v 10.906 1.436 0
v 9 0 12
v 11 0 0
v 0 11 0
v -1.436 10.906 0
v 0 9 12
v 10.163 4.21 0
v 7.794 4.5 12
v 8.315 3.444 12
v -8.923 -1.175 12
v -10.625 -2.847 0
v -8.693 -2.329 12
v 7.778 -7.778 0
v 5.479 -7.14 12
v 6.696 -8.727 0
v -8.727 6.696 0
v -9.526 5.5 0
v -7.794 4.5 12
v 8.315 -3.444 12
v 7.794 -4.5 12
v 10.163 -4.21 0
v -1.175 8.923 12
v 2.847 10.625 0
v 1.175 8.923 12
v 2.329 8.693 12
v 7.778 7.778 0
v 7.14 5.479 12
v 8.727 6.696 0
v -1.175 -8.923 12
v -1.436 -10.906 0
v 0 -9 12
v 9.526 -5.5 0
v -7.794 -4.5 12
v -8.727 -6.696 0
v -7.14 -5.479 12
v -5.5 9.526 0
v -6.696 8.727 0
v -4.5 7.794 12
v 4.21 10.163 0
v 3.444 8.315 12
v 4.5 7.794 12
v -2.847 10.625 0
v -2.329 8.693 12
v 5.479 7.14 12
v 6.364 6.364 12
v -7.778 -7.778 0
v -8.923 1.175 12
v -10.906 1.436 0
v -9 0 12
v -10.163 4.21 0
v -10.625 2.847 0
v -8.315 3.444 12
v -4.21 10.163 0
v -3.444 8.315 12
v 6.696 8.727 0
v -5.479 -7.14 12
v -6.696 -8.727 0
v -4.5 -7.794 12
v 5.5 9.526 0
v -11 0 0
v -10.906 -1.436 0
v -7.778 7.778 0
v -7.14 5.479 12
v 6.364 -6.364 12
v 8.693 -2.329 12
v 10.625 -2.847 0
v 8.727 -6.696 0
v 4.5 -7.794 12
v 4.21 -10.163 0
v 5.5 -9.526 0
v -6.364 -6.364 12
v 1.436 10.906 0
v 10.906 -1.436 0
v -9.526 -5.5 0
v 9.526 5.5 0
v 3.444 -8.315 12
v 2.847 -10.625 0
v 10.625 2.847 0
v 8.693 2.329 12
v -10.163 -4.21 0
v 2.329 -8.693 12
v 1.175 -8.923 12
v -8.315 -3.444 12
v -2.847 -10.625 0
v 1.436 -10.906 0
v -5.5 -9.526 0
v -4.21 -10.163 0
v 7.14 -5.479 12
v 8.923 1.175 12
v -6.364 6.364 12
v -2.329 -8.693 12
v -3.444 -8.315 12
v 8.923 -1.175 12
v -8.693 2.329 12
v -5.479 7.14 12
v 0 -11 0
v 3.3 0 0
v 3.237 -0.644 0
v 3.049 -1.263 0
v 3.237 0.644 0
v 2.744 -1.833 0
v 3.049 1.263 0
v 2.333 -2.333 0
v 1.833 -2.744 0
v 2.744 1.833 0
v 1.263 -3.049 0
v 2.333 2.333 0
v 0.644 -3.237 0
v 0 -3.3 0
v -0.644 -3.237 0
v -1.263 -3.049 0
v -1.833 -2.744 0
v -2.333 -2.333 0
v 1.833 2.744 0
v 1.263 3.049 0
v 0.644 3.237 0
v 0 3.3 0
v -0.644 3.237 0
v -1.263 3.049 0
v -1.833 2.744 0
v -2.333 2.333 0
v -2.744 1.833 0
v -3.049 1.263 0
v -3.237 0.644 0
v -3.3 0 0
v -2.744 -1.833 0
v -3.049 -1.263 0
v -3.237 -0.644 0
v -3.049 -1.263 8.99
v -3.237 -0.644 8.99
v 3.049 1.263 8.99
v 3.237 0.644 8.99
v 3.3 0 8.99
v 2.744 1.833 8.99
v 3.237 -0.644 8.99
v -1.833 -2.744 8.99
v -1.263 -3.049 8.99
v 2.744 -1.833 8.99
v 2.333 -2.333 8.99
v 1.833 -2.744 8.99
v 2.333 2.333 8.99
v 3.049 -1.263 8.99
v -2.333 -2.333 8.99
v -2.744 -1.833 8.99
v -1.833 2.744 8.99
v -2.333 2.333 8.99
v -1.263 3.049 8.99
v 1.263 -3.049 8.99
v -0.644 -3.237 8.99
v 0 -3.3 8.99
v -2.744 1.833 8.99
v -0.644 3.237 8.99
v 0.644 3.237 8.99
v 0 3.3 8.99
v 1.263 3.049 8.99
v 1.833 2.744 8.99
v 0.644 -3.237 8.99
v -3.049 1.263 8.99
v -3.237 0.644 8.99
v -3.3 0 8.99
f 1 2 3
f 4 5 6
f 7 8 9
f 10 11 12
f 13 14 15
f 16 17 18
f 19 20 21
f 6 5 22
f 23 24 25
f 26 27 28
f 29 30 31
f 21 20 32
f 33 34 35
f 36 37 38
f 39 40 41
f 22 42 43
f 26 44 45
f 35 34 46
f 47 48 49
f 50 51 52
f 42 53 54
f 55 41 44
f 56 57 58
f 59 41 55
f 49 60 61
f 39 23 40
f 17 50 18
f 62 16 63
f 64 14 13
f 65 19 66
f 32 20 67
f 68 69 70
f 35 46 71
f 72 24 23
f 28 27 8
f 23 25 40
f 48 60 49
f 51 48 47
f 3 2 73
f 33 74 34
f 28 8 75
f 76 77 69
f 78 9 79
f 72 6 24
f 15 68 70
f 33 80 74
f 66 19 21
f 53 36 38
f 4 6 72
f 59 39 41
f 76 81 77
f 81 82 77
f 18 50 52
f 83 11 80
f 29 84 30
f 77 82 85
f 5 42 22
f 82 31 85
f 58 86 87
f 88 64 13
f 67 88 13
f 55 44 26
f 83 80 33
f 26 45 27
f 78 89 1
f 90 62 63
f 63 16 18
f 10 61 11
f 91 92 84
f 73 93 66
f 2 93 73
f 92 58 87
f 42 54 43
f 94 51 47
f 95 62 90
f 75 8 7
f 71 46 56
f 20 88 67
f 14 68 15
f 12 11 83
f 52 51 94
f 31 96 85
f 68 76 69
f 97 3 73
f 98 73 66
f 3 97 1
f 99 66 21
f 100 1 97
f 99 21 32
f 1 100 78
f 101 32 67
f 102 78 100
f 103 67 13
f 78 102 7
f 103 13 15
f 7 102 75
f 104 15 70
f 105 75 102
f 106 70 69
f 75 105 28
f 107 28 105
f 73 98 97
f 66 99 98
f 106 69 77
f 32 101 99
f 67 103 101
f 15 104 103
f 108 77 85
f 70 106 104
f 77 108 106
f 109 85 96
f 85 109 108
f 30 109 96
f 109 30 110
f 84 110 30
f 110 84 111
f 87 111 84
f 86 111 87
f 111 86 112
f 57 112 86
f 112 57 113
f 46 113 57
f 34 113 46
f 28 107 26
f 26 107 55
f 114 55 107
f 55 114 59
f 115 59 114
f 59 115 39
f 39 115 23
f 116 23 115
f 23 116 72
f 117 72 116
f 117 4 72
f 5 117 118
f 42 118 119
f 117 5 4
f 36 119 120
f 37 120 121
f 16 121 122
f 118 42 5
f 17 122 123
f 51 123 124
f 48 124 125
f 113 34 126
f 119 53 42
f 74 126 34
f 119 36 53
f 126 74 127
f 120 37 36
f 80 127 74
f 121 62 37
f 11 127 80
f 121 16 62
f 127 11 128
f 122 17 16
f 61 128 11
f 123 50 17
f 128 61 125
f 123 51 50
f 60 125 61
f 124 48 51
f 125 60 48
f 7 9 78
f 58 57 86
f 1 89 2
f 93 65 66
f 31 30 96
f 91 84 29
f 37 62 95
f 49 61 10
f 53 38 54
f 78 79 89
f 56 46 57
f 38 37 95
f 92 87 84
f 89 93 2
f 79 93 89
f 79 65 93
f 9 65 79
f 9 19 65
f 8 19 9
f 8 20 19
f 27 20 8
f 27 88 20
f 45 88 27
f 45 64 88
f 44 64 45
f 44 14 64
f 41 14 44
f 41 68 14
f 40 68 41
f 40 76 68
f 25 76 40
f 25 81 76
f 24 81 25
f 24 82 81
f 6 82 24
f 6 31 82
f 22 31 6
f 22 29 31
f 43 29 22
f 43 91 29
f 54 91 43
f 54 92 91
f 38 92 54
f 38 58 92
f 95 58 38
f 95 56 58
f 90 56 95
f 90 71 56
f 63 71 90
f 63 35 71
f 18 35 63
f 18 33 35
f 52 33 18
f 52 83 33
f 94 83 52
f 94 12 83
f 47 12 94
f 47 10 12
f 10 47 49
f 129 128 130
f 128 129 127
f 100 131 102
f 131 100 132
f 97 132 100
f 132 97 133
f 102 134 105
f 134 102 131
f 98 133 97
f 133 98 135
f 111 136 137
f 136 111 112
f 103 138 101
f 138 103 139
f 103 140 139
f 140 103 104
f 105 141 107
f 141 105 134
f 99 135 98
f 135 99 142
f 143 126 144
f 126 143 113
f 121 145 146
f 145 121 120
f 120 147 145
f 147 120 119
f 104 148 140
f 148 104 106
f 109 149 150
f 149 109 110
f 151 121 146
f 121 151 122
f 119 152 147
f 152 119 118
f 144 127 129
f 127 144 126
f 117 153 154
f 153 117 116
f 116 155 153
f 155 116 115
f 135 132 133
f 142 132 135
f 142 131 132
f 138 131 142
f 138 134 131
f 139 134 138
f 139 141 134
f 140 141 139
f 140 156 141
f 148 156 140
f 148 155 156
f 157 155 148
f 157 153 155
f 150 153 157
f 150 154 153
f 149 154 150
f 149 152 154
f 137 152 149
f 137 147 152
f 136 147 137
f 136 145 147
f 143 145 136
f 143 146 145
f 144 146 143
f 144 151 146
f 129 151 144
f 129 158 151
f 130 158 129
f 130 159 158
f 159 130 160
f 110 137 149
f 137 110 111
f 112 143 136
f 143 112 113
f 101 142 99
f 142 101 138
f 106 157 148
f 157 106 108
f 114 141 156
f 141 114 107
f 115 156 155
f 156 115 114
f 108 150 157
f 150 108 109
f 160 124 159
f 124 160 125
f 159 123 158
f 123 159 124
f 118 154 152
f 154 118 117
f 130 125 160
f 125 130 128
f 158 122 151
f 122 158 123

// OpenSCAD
cap_diameter=22; cap_height=12; socket_diameter=6.6; socket_depth=9;
module carousel_cap(){ difference(){ cylinder(d1=cap_diameter,d2=18,h=cap_height,$fn=48); translate([0,0,-0.01]) cylinder(d=socket_diameter,h=socket_depth,$fn=32); }}
assert(socket_diameter==6.6 && socket_depth<cap_height); echo("SCADCTL_REQUIREMENT:parameters:PASS"); carousel_cap();
